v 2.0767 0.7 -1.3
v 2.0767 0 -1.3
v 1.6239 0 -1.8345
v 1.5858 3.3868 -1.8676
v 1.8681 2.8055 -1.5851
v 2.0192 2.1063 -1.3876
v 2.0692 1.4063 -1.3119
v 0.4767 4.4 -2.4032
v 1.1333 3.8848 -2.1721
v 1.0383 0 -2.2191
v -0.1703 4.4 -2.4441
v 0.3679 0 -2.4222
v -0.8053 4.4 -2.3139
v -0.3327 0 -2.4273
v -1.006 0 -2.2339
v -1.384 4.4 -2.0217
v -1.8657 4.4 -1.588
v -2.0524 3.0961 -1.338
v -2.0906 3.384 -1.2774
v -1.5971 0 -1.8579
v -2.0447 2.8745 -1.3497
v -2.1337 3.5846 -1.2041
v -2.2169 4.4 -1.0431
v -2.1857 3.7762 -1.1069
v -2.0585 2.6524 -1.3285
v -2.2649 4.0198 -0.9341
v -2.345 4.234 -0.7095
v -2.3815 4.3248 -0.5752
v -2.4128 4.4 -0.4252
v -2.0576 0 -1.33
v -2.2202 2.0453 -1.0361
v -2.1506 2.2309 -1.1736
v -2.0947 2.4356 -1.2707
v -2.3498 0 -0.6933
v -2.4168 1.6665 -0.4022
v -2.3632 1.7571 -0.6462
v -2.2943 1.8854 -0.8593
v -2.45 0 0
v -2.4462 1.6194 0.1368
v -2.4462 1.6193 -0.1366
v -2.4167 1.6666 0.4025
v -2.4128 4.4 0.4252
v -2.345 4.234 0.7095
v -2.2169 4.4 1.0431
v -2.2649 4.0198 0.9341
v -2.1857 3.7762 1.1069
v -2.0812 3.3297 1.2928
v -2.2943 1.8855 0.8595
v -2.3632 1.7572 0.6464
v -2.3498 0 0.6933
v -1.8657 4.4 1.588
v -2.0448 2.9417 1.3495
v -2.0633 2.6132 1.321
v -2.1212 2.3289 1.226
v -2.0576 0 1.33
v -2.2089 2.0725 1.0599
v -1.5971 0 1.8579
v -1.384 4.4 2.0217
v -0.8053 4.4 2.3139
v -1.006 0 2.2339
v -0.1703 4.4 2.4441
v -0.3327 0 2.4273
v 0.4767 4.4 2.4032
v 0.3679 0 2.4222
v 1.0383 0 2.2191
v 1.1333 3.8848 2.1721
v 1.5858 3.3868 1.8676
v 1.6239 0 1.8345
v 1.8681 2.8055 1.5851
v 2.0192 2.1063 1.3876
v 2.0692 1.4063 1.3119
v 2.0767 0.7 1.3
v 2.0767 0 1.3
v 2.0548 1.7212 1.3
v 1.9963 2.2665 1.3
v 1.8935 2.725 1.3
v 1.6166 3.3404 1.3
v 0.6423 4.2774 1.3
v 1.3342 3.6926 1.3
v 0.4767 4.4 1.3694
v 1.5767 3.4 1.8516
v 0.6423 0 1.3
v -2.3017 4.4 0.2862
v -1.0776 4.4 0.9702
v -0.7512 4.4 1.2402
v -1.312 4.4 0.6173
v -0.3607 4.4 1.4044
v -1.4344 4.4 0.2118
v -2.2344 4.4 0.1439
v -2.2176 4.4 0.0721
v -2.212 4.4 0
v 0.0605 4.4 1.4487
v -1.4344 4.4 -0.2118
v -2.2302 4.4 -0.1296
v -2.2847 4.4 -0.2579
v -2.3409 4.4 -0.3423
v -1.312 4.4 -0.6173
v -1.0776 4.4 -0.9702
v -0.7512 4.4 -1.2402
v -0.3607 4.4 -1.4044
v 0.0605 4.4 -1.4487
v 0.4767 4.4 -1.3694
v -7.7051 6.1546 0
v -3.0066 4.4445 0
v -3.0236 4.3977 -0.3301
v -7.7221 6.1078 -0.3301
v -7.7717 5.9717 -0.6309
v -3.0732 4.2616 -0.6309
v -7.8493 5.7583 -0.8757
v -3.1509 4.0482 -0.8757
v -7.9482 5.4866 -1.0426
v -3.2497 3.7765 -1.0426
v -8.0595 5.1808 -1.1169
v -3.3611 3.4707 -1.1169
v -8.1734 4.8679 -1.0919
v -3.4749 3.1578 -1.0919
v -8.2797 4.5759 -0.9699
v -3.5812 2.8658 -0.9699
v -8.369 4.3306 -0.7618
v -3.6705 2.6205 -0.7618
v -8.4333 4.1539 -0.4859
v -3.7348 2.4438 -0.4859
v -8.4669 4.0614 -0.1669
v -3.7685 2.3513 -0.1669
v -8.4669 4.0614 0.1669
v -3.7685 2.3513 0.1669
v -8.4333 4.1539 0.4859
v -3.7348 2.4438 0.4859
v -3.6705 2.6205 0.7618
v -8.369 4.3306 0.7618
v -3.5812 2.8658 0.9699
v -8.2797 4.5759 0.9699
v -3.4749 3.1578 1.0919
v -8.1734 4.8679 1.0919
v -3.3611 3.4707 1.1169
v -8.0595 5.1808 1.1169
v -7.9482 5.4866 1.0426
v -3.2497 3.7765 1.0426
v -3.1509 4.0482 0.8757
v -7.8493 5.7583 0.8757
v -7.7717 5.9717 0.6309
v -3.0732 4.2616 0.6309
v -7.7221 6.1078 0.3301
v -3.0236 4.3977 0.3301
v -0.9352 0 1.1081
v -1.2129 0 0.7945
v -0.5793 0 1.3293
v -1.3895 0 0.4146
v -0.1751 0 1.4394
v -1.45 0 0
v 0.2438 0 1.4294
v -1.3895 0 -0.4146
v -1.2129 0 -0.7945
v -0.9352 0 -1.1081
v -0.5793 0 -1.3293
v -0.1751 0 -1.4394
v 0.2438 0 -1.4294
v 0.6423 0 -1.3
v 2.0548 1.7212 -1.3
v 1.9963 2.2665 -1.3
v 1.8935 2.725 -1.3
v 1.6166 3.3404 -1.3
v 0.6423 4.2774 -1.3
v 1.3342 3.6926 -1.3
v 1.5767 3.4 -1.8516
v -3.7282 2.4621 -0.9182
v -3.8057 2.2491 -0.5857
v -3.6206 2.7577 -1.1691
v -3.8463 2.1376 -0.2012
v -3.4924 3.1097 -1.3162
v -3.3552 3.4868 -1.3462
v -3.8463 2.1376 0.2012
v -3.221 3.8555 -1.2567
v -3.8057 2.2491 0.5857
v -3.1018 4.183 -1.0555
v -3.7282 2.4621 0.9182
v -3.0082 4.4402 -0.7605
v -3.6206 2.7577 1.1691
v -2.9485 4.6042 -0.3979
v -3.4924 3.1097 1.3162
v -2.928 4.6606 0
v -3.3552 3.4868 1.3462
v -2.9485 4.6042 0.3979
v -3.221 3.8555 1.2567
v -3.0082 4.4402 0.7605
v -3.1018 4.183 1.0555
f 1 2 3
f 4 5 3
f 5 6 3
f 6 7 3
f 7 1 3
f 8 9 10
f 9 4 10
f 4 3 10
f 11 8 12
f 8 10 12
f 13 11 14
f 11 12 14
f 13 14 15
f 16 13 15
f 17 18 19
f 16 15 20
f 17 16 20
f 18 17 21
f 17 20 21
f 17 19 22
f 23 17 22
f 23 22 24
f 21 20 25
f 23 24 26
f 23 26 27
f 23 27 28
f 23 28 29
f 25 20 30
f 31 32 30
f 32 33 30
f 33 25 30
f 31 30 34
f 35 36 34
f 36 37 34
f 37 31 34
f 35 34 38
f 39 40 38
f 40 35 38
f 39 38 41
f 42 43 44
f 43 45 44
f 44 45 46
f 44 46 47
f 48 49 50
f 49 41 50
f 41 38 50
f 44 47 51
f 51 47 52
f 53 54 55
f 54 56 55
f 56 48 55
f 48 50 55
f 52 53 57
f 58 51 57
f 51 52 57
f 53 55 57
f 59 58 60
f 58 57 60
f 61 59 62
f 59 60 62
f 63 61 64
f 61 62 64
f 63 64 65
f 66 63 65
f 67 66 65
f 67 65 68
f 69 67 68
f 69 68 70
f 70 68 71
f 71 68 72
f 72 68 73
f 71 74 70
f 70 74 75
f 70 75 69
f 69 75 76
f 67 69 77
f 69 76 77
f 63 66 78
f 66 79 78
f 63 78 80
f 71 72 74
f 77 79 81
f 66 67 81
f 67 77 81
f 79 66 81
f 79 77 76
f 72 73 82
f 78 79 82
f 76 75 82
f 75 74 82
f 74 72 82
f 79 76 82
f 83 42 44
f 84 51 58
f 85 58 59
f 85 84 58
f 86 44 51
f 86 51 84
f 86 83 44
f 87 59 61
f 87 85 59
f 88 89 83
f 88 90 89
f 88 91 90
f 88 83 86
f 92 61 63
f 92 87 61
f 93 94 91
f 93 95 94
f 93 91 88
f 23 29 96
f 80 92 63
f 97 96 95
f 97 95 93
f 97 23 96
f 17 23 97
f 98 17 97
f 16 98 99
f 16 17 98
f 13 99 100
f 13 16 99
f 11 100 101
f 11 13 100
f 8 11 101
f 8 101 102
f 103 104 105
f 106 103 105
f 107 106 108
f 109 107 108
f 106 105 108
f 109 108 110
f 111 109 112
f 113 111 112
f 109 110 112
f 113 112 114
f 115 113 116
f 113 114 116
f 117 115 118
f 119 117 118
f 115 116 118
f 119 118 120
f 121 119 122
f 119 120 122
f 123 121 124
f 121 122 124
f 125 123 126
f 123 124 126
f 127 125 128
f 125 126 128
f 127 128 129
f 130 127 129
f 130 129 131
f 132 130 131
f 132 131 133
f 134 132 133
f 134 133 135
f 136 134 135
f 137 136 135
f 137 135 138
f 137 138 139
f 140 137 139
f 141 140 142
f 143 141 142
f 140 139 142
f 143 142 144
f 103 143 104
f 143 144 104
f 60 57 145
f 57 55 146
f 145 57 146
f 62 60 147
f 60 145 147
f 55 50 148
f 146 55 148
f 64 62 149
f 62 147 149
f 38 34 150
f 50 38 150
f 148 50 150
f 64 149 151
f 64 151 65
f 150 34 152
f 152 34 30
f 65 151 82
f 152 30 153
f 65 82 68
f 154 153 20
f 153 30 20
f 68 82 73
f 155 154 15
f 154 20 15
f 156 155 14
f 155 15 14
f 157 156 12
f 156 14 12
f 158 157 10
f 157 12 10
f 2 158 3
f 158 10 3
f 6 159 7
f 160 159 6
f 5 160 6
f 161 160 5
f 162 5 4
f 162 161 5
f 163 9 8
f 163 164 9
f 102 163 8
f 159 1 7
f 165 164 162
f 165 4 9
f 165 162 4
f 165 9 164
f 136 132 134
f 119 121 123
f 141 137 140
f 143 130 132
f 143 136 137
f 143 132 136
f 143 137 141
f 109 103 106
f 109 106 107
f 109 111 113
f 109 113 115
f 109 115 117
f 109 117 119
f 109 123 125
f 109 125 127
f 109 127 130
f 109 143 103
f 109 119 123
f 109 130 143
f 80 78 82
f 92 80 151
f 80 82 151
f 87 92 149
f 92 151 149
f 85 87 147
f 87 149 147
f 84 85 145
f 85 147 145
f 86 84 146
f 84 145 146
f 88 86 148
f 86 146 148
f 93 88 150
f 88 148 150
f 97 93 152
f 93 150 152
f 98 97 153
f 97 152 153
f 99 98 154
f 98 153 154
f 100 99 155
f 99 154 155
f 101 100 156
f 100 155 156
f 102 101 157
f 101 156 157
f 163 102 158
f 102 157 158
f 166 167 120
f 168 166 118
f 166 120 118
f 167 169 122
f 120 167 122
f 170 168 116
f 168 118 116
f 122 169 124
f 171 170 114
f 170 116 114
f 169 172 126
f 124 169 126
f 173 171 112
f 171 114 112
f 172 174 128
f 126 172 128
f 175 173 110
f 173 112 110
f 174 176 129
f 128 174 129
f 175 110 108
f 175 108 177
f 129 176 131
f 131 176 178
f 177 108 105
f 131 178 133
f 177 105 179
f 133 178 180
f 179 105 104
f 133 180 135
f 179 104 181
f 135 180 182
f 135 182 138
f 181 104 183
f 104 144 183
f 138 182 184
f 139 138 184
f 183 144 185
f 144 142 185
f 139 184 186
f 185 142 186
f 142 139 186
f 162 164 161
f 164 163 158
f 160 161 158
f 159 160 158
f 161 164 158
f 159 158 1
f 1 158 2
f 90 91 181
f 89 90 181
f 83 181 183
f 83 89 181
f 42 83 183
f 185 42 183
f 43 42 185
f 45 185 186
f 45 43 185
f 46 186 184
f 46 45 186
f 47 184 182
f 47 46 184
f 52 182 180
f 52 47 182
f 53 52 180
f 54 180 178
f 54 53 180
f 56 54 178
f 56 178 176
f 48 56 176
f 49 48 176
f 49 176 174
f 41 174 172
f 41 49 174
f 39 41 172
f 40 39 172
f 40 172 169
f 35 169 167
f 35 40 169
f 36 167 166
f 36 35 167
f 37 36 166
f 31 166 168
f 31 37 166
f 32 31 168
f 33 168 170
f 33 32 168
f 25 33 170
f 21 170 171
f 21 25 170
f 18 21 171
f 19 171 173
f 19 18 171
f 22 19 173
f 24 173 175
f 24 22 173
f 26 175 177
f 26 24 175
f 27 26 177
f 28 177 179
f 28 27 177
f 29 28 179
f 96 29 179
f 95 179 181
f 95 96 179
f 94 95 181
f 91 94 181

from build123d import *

# Parameters (mm, degrees)
EXTRUDE1_DEPTH             = 4.4
EXTRUDE5_DEPTH             = 6.600446411
EXTRUDE5_DEPTH_BACK        = 6.600446411
EXTRUDE6_REACH             = 8.622
SKETCH15_R                 = 1.35
EXTRUDE6_DIRECTION_2_DEPTH = 1
SKETCH16_R                 = 1.12
EXTRUDE7_DEPTH             = 5


with BuildPart() as part:
    # Sketch1 → Extrude1 (new body)
    with BuildSketch(Plane(origin=(0, 0, 0), x_dir=(1, 0, 0), z_dir=(0, 1, 0))):
        with BuildLine():
            Line((2.076655966, -1.3), (0.642261629, -1.3))
            ThreePointArc((0.642261629, -1.3), (-1.45, 0), (0.642261629, 1.3))
            Line((0.642261629, 1.3), (2.076655966, 1.3))
            ThreePointArc((2.076655966, 1.3), (-2.45, 0), (2.076655966, -1.3))
        make_face()
    extrude(amount=EXTRUDE1_DEPTH)

    # Sketch11 → Extrude5 (cut, two sides: drawn at the far end of the back side and taken through both)
    with BuildSketch(Plane.XY.offset(-EXTRUDE5_DEPTH_BACK)):
        with BuildLine():
            Line((0.476655966, 4.4), (2.076655966, 4.4))
            Line((2.076655966, 4.4), (2.076655966, 0.7))
            add(Edge.make_bspline(
                [(2.076655966, 0.7), (2.075619632, 1.692222339), (2.074022236, 3.22162422), (0.891869454, 4.093697352), (0.476655966, 4.4)],
                knots=[0, 0, 0, 0, 0.648764953, 1, 1, 1, 1], degree=3))
        make_face()
    extrude(amount=EXTRUDE5_DEPTH + EXTRUDE5_DEPTH_BACK, mode=Mode.SUBTRACT)

    # Sketch15 → Extrude6 (add, up to next)
    with BuildSketch(Plane(origin=(-3.143655548, 1.144197046, 0), x_dir=(0, 0, -1), z_dir=(0.9396926207859126, -0.34202014332565683, 0)), mode=Mode.PRIVATE) as extrude6_sk1:
        with Locations((0, 2.028113142)):
            Circle(SKETCH15_R)
    extrude6_tool1 = extrude(extrude6_sk1.sketch, amount=EXTRUDE6_REACH, mode=Mode.PRIVATE) - part.part
    add(extrude6_tool1.solids().sort_by_distance((-2.45, 3.05, 0))[0])

    # Sketch15 → Extrude6 direction 2 (add)
    with BuildSketch(Plane(origin=(-3.143655548, 1.144197046, 0), x_dir=(0, 0, -1), z_dir=(0.9396926207859126, -0.34202014332565683, 0))):
        with Locations((0, 2.028113142)):
            Circle(SKETCH15_R)
    extrude(amount=-EXTRUDE6_DIRECTION_2_DEPTH)

    # Sketch16 → Extrude7 (add)
    with BuildSketch(Plane(origin=(-4.083348168, 1.486217189, 0), x_dir=(0, 0, 1), z_dir=(-0.9396926207859126, 0.34202014332565694, 0))):
        with Locations((0, 2.028113142)):
            Circle(SKETCH16_R)
    extrude(amount=EXTRUDE7_DEPTH)


solid = part.part
